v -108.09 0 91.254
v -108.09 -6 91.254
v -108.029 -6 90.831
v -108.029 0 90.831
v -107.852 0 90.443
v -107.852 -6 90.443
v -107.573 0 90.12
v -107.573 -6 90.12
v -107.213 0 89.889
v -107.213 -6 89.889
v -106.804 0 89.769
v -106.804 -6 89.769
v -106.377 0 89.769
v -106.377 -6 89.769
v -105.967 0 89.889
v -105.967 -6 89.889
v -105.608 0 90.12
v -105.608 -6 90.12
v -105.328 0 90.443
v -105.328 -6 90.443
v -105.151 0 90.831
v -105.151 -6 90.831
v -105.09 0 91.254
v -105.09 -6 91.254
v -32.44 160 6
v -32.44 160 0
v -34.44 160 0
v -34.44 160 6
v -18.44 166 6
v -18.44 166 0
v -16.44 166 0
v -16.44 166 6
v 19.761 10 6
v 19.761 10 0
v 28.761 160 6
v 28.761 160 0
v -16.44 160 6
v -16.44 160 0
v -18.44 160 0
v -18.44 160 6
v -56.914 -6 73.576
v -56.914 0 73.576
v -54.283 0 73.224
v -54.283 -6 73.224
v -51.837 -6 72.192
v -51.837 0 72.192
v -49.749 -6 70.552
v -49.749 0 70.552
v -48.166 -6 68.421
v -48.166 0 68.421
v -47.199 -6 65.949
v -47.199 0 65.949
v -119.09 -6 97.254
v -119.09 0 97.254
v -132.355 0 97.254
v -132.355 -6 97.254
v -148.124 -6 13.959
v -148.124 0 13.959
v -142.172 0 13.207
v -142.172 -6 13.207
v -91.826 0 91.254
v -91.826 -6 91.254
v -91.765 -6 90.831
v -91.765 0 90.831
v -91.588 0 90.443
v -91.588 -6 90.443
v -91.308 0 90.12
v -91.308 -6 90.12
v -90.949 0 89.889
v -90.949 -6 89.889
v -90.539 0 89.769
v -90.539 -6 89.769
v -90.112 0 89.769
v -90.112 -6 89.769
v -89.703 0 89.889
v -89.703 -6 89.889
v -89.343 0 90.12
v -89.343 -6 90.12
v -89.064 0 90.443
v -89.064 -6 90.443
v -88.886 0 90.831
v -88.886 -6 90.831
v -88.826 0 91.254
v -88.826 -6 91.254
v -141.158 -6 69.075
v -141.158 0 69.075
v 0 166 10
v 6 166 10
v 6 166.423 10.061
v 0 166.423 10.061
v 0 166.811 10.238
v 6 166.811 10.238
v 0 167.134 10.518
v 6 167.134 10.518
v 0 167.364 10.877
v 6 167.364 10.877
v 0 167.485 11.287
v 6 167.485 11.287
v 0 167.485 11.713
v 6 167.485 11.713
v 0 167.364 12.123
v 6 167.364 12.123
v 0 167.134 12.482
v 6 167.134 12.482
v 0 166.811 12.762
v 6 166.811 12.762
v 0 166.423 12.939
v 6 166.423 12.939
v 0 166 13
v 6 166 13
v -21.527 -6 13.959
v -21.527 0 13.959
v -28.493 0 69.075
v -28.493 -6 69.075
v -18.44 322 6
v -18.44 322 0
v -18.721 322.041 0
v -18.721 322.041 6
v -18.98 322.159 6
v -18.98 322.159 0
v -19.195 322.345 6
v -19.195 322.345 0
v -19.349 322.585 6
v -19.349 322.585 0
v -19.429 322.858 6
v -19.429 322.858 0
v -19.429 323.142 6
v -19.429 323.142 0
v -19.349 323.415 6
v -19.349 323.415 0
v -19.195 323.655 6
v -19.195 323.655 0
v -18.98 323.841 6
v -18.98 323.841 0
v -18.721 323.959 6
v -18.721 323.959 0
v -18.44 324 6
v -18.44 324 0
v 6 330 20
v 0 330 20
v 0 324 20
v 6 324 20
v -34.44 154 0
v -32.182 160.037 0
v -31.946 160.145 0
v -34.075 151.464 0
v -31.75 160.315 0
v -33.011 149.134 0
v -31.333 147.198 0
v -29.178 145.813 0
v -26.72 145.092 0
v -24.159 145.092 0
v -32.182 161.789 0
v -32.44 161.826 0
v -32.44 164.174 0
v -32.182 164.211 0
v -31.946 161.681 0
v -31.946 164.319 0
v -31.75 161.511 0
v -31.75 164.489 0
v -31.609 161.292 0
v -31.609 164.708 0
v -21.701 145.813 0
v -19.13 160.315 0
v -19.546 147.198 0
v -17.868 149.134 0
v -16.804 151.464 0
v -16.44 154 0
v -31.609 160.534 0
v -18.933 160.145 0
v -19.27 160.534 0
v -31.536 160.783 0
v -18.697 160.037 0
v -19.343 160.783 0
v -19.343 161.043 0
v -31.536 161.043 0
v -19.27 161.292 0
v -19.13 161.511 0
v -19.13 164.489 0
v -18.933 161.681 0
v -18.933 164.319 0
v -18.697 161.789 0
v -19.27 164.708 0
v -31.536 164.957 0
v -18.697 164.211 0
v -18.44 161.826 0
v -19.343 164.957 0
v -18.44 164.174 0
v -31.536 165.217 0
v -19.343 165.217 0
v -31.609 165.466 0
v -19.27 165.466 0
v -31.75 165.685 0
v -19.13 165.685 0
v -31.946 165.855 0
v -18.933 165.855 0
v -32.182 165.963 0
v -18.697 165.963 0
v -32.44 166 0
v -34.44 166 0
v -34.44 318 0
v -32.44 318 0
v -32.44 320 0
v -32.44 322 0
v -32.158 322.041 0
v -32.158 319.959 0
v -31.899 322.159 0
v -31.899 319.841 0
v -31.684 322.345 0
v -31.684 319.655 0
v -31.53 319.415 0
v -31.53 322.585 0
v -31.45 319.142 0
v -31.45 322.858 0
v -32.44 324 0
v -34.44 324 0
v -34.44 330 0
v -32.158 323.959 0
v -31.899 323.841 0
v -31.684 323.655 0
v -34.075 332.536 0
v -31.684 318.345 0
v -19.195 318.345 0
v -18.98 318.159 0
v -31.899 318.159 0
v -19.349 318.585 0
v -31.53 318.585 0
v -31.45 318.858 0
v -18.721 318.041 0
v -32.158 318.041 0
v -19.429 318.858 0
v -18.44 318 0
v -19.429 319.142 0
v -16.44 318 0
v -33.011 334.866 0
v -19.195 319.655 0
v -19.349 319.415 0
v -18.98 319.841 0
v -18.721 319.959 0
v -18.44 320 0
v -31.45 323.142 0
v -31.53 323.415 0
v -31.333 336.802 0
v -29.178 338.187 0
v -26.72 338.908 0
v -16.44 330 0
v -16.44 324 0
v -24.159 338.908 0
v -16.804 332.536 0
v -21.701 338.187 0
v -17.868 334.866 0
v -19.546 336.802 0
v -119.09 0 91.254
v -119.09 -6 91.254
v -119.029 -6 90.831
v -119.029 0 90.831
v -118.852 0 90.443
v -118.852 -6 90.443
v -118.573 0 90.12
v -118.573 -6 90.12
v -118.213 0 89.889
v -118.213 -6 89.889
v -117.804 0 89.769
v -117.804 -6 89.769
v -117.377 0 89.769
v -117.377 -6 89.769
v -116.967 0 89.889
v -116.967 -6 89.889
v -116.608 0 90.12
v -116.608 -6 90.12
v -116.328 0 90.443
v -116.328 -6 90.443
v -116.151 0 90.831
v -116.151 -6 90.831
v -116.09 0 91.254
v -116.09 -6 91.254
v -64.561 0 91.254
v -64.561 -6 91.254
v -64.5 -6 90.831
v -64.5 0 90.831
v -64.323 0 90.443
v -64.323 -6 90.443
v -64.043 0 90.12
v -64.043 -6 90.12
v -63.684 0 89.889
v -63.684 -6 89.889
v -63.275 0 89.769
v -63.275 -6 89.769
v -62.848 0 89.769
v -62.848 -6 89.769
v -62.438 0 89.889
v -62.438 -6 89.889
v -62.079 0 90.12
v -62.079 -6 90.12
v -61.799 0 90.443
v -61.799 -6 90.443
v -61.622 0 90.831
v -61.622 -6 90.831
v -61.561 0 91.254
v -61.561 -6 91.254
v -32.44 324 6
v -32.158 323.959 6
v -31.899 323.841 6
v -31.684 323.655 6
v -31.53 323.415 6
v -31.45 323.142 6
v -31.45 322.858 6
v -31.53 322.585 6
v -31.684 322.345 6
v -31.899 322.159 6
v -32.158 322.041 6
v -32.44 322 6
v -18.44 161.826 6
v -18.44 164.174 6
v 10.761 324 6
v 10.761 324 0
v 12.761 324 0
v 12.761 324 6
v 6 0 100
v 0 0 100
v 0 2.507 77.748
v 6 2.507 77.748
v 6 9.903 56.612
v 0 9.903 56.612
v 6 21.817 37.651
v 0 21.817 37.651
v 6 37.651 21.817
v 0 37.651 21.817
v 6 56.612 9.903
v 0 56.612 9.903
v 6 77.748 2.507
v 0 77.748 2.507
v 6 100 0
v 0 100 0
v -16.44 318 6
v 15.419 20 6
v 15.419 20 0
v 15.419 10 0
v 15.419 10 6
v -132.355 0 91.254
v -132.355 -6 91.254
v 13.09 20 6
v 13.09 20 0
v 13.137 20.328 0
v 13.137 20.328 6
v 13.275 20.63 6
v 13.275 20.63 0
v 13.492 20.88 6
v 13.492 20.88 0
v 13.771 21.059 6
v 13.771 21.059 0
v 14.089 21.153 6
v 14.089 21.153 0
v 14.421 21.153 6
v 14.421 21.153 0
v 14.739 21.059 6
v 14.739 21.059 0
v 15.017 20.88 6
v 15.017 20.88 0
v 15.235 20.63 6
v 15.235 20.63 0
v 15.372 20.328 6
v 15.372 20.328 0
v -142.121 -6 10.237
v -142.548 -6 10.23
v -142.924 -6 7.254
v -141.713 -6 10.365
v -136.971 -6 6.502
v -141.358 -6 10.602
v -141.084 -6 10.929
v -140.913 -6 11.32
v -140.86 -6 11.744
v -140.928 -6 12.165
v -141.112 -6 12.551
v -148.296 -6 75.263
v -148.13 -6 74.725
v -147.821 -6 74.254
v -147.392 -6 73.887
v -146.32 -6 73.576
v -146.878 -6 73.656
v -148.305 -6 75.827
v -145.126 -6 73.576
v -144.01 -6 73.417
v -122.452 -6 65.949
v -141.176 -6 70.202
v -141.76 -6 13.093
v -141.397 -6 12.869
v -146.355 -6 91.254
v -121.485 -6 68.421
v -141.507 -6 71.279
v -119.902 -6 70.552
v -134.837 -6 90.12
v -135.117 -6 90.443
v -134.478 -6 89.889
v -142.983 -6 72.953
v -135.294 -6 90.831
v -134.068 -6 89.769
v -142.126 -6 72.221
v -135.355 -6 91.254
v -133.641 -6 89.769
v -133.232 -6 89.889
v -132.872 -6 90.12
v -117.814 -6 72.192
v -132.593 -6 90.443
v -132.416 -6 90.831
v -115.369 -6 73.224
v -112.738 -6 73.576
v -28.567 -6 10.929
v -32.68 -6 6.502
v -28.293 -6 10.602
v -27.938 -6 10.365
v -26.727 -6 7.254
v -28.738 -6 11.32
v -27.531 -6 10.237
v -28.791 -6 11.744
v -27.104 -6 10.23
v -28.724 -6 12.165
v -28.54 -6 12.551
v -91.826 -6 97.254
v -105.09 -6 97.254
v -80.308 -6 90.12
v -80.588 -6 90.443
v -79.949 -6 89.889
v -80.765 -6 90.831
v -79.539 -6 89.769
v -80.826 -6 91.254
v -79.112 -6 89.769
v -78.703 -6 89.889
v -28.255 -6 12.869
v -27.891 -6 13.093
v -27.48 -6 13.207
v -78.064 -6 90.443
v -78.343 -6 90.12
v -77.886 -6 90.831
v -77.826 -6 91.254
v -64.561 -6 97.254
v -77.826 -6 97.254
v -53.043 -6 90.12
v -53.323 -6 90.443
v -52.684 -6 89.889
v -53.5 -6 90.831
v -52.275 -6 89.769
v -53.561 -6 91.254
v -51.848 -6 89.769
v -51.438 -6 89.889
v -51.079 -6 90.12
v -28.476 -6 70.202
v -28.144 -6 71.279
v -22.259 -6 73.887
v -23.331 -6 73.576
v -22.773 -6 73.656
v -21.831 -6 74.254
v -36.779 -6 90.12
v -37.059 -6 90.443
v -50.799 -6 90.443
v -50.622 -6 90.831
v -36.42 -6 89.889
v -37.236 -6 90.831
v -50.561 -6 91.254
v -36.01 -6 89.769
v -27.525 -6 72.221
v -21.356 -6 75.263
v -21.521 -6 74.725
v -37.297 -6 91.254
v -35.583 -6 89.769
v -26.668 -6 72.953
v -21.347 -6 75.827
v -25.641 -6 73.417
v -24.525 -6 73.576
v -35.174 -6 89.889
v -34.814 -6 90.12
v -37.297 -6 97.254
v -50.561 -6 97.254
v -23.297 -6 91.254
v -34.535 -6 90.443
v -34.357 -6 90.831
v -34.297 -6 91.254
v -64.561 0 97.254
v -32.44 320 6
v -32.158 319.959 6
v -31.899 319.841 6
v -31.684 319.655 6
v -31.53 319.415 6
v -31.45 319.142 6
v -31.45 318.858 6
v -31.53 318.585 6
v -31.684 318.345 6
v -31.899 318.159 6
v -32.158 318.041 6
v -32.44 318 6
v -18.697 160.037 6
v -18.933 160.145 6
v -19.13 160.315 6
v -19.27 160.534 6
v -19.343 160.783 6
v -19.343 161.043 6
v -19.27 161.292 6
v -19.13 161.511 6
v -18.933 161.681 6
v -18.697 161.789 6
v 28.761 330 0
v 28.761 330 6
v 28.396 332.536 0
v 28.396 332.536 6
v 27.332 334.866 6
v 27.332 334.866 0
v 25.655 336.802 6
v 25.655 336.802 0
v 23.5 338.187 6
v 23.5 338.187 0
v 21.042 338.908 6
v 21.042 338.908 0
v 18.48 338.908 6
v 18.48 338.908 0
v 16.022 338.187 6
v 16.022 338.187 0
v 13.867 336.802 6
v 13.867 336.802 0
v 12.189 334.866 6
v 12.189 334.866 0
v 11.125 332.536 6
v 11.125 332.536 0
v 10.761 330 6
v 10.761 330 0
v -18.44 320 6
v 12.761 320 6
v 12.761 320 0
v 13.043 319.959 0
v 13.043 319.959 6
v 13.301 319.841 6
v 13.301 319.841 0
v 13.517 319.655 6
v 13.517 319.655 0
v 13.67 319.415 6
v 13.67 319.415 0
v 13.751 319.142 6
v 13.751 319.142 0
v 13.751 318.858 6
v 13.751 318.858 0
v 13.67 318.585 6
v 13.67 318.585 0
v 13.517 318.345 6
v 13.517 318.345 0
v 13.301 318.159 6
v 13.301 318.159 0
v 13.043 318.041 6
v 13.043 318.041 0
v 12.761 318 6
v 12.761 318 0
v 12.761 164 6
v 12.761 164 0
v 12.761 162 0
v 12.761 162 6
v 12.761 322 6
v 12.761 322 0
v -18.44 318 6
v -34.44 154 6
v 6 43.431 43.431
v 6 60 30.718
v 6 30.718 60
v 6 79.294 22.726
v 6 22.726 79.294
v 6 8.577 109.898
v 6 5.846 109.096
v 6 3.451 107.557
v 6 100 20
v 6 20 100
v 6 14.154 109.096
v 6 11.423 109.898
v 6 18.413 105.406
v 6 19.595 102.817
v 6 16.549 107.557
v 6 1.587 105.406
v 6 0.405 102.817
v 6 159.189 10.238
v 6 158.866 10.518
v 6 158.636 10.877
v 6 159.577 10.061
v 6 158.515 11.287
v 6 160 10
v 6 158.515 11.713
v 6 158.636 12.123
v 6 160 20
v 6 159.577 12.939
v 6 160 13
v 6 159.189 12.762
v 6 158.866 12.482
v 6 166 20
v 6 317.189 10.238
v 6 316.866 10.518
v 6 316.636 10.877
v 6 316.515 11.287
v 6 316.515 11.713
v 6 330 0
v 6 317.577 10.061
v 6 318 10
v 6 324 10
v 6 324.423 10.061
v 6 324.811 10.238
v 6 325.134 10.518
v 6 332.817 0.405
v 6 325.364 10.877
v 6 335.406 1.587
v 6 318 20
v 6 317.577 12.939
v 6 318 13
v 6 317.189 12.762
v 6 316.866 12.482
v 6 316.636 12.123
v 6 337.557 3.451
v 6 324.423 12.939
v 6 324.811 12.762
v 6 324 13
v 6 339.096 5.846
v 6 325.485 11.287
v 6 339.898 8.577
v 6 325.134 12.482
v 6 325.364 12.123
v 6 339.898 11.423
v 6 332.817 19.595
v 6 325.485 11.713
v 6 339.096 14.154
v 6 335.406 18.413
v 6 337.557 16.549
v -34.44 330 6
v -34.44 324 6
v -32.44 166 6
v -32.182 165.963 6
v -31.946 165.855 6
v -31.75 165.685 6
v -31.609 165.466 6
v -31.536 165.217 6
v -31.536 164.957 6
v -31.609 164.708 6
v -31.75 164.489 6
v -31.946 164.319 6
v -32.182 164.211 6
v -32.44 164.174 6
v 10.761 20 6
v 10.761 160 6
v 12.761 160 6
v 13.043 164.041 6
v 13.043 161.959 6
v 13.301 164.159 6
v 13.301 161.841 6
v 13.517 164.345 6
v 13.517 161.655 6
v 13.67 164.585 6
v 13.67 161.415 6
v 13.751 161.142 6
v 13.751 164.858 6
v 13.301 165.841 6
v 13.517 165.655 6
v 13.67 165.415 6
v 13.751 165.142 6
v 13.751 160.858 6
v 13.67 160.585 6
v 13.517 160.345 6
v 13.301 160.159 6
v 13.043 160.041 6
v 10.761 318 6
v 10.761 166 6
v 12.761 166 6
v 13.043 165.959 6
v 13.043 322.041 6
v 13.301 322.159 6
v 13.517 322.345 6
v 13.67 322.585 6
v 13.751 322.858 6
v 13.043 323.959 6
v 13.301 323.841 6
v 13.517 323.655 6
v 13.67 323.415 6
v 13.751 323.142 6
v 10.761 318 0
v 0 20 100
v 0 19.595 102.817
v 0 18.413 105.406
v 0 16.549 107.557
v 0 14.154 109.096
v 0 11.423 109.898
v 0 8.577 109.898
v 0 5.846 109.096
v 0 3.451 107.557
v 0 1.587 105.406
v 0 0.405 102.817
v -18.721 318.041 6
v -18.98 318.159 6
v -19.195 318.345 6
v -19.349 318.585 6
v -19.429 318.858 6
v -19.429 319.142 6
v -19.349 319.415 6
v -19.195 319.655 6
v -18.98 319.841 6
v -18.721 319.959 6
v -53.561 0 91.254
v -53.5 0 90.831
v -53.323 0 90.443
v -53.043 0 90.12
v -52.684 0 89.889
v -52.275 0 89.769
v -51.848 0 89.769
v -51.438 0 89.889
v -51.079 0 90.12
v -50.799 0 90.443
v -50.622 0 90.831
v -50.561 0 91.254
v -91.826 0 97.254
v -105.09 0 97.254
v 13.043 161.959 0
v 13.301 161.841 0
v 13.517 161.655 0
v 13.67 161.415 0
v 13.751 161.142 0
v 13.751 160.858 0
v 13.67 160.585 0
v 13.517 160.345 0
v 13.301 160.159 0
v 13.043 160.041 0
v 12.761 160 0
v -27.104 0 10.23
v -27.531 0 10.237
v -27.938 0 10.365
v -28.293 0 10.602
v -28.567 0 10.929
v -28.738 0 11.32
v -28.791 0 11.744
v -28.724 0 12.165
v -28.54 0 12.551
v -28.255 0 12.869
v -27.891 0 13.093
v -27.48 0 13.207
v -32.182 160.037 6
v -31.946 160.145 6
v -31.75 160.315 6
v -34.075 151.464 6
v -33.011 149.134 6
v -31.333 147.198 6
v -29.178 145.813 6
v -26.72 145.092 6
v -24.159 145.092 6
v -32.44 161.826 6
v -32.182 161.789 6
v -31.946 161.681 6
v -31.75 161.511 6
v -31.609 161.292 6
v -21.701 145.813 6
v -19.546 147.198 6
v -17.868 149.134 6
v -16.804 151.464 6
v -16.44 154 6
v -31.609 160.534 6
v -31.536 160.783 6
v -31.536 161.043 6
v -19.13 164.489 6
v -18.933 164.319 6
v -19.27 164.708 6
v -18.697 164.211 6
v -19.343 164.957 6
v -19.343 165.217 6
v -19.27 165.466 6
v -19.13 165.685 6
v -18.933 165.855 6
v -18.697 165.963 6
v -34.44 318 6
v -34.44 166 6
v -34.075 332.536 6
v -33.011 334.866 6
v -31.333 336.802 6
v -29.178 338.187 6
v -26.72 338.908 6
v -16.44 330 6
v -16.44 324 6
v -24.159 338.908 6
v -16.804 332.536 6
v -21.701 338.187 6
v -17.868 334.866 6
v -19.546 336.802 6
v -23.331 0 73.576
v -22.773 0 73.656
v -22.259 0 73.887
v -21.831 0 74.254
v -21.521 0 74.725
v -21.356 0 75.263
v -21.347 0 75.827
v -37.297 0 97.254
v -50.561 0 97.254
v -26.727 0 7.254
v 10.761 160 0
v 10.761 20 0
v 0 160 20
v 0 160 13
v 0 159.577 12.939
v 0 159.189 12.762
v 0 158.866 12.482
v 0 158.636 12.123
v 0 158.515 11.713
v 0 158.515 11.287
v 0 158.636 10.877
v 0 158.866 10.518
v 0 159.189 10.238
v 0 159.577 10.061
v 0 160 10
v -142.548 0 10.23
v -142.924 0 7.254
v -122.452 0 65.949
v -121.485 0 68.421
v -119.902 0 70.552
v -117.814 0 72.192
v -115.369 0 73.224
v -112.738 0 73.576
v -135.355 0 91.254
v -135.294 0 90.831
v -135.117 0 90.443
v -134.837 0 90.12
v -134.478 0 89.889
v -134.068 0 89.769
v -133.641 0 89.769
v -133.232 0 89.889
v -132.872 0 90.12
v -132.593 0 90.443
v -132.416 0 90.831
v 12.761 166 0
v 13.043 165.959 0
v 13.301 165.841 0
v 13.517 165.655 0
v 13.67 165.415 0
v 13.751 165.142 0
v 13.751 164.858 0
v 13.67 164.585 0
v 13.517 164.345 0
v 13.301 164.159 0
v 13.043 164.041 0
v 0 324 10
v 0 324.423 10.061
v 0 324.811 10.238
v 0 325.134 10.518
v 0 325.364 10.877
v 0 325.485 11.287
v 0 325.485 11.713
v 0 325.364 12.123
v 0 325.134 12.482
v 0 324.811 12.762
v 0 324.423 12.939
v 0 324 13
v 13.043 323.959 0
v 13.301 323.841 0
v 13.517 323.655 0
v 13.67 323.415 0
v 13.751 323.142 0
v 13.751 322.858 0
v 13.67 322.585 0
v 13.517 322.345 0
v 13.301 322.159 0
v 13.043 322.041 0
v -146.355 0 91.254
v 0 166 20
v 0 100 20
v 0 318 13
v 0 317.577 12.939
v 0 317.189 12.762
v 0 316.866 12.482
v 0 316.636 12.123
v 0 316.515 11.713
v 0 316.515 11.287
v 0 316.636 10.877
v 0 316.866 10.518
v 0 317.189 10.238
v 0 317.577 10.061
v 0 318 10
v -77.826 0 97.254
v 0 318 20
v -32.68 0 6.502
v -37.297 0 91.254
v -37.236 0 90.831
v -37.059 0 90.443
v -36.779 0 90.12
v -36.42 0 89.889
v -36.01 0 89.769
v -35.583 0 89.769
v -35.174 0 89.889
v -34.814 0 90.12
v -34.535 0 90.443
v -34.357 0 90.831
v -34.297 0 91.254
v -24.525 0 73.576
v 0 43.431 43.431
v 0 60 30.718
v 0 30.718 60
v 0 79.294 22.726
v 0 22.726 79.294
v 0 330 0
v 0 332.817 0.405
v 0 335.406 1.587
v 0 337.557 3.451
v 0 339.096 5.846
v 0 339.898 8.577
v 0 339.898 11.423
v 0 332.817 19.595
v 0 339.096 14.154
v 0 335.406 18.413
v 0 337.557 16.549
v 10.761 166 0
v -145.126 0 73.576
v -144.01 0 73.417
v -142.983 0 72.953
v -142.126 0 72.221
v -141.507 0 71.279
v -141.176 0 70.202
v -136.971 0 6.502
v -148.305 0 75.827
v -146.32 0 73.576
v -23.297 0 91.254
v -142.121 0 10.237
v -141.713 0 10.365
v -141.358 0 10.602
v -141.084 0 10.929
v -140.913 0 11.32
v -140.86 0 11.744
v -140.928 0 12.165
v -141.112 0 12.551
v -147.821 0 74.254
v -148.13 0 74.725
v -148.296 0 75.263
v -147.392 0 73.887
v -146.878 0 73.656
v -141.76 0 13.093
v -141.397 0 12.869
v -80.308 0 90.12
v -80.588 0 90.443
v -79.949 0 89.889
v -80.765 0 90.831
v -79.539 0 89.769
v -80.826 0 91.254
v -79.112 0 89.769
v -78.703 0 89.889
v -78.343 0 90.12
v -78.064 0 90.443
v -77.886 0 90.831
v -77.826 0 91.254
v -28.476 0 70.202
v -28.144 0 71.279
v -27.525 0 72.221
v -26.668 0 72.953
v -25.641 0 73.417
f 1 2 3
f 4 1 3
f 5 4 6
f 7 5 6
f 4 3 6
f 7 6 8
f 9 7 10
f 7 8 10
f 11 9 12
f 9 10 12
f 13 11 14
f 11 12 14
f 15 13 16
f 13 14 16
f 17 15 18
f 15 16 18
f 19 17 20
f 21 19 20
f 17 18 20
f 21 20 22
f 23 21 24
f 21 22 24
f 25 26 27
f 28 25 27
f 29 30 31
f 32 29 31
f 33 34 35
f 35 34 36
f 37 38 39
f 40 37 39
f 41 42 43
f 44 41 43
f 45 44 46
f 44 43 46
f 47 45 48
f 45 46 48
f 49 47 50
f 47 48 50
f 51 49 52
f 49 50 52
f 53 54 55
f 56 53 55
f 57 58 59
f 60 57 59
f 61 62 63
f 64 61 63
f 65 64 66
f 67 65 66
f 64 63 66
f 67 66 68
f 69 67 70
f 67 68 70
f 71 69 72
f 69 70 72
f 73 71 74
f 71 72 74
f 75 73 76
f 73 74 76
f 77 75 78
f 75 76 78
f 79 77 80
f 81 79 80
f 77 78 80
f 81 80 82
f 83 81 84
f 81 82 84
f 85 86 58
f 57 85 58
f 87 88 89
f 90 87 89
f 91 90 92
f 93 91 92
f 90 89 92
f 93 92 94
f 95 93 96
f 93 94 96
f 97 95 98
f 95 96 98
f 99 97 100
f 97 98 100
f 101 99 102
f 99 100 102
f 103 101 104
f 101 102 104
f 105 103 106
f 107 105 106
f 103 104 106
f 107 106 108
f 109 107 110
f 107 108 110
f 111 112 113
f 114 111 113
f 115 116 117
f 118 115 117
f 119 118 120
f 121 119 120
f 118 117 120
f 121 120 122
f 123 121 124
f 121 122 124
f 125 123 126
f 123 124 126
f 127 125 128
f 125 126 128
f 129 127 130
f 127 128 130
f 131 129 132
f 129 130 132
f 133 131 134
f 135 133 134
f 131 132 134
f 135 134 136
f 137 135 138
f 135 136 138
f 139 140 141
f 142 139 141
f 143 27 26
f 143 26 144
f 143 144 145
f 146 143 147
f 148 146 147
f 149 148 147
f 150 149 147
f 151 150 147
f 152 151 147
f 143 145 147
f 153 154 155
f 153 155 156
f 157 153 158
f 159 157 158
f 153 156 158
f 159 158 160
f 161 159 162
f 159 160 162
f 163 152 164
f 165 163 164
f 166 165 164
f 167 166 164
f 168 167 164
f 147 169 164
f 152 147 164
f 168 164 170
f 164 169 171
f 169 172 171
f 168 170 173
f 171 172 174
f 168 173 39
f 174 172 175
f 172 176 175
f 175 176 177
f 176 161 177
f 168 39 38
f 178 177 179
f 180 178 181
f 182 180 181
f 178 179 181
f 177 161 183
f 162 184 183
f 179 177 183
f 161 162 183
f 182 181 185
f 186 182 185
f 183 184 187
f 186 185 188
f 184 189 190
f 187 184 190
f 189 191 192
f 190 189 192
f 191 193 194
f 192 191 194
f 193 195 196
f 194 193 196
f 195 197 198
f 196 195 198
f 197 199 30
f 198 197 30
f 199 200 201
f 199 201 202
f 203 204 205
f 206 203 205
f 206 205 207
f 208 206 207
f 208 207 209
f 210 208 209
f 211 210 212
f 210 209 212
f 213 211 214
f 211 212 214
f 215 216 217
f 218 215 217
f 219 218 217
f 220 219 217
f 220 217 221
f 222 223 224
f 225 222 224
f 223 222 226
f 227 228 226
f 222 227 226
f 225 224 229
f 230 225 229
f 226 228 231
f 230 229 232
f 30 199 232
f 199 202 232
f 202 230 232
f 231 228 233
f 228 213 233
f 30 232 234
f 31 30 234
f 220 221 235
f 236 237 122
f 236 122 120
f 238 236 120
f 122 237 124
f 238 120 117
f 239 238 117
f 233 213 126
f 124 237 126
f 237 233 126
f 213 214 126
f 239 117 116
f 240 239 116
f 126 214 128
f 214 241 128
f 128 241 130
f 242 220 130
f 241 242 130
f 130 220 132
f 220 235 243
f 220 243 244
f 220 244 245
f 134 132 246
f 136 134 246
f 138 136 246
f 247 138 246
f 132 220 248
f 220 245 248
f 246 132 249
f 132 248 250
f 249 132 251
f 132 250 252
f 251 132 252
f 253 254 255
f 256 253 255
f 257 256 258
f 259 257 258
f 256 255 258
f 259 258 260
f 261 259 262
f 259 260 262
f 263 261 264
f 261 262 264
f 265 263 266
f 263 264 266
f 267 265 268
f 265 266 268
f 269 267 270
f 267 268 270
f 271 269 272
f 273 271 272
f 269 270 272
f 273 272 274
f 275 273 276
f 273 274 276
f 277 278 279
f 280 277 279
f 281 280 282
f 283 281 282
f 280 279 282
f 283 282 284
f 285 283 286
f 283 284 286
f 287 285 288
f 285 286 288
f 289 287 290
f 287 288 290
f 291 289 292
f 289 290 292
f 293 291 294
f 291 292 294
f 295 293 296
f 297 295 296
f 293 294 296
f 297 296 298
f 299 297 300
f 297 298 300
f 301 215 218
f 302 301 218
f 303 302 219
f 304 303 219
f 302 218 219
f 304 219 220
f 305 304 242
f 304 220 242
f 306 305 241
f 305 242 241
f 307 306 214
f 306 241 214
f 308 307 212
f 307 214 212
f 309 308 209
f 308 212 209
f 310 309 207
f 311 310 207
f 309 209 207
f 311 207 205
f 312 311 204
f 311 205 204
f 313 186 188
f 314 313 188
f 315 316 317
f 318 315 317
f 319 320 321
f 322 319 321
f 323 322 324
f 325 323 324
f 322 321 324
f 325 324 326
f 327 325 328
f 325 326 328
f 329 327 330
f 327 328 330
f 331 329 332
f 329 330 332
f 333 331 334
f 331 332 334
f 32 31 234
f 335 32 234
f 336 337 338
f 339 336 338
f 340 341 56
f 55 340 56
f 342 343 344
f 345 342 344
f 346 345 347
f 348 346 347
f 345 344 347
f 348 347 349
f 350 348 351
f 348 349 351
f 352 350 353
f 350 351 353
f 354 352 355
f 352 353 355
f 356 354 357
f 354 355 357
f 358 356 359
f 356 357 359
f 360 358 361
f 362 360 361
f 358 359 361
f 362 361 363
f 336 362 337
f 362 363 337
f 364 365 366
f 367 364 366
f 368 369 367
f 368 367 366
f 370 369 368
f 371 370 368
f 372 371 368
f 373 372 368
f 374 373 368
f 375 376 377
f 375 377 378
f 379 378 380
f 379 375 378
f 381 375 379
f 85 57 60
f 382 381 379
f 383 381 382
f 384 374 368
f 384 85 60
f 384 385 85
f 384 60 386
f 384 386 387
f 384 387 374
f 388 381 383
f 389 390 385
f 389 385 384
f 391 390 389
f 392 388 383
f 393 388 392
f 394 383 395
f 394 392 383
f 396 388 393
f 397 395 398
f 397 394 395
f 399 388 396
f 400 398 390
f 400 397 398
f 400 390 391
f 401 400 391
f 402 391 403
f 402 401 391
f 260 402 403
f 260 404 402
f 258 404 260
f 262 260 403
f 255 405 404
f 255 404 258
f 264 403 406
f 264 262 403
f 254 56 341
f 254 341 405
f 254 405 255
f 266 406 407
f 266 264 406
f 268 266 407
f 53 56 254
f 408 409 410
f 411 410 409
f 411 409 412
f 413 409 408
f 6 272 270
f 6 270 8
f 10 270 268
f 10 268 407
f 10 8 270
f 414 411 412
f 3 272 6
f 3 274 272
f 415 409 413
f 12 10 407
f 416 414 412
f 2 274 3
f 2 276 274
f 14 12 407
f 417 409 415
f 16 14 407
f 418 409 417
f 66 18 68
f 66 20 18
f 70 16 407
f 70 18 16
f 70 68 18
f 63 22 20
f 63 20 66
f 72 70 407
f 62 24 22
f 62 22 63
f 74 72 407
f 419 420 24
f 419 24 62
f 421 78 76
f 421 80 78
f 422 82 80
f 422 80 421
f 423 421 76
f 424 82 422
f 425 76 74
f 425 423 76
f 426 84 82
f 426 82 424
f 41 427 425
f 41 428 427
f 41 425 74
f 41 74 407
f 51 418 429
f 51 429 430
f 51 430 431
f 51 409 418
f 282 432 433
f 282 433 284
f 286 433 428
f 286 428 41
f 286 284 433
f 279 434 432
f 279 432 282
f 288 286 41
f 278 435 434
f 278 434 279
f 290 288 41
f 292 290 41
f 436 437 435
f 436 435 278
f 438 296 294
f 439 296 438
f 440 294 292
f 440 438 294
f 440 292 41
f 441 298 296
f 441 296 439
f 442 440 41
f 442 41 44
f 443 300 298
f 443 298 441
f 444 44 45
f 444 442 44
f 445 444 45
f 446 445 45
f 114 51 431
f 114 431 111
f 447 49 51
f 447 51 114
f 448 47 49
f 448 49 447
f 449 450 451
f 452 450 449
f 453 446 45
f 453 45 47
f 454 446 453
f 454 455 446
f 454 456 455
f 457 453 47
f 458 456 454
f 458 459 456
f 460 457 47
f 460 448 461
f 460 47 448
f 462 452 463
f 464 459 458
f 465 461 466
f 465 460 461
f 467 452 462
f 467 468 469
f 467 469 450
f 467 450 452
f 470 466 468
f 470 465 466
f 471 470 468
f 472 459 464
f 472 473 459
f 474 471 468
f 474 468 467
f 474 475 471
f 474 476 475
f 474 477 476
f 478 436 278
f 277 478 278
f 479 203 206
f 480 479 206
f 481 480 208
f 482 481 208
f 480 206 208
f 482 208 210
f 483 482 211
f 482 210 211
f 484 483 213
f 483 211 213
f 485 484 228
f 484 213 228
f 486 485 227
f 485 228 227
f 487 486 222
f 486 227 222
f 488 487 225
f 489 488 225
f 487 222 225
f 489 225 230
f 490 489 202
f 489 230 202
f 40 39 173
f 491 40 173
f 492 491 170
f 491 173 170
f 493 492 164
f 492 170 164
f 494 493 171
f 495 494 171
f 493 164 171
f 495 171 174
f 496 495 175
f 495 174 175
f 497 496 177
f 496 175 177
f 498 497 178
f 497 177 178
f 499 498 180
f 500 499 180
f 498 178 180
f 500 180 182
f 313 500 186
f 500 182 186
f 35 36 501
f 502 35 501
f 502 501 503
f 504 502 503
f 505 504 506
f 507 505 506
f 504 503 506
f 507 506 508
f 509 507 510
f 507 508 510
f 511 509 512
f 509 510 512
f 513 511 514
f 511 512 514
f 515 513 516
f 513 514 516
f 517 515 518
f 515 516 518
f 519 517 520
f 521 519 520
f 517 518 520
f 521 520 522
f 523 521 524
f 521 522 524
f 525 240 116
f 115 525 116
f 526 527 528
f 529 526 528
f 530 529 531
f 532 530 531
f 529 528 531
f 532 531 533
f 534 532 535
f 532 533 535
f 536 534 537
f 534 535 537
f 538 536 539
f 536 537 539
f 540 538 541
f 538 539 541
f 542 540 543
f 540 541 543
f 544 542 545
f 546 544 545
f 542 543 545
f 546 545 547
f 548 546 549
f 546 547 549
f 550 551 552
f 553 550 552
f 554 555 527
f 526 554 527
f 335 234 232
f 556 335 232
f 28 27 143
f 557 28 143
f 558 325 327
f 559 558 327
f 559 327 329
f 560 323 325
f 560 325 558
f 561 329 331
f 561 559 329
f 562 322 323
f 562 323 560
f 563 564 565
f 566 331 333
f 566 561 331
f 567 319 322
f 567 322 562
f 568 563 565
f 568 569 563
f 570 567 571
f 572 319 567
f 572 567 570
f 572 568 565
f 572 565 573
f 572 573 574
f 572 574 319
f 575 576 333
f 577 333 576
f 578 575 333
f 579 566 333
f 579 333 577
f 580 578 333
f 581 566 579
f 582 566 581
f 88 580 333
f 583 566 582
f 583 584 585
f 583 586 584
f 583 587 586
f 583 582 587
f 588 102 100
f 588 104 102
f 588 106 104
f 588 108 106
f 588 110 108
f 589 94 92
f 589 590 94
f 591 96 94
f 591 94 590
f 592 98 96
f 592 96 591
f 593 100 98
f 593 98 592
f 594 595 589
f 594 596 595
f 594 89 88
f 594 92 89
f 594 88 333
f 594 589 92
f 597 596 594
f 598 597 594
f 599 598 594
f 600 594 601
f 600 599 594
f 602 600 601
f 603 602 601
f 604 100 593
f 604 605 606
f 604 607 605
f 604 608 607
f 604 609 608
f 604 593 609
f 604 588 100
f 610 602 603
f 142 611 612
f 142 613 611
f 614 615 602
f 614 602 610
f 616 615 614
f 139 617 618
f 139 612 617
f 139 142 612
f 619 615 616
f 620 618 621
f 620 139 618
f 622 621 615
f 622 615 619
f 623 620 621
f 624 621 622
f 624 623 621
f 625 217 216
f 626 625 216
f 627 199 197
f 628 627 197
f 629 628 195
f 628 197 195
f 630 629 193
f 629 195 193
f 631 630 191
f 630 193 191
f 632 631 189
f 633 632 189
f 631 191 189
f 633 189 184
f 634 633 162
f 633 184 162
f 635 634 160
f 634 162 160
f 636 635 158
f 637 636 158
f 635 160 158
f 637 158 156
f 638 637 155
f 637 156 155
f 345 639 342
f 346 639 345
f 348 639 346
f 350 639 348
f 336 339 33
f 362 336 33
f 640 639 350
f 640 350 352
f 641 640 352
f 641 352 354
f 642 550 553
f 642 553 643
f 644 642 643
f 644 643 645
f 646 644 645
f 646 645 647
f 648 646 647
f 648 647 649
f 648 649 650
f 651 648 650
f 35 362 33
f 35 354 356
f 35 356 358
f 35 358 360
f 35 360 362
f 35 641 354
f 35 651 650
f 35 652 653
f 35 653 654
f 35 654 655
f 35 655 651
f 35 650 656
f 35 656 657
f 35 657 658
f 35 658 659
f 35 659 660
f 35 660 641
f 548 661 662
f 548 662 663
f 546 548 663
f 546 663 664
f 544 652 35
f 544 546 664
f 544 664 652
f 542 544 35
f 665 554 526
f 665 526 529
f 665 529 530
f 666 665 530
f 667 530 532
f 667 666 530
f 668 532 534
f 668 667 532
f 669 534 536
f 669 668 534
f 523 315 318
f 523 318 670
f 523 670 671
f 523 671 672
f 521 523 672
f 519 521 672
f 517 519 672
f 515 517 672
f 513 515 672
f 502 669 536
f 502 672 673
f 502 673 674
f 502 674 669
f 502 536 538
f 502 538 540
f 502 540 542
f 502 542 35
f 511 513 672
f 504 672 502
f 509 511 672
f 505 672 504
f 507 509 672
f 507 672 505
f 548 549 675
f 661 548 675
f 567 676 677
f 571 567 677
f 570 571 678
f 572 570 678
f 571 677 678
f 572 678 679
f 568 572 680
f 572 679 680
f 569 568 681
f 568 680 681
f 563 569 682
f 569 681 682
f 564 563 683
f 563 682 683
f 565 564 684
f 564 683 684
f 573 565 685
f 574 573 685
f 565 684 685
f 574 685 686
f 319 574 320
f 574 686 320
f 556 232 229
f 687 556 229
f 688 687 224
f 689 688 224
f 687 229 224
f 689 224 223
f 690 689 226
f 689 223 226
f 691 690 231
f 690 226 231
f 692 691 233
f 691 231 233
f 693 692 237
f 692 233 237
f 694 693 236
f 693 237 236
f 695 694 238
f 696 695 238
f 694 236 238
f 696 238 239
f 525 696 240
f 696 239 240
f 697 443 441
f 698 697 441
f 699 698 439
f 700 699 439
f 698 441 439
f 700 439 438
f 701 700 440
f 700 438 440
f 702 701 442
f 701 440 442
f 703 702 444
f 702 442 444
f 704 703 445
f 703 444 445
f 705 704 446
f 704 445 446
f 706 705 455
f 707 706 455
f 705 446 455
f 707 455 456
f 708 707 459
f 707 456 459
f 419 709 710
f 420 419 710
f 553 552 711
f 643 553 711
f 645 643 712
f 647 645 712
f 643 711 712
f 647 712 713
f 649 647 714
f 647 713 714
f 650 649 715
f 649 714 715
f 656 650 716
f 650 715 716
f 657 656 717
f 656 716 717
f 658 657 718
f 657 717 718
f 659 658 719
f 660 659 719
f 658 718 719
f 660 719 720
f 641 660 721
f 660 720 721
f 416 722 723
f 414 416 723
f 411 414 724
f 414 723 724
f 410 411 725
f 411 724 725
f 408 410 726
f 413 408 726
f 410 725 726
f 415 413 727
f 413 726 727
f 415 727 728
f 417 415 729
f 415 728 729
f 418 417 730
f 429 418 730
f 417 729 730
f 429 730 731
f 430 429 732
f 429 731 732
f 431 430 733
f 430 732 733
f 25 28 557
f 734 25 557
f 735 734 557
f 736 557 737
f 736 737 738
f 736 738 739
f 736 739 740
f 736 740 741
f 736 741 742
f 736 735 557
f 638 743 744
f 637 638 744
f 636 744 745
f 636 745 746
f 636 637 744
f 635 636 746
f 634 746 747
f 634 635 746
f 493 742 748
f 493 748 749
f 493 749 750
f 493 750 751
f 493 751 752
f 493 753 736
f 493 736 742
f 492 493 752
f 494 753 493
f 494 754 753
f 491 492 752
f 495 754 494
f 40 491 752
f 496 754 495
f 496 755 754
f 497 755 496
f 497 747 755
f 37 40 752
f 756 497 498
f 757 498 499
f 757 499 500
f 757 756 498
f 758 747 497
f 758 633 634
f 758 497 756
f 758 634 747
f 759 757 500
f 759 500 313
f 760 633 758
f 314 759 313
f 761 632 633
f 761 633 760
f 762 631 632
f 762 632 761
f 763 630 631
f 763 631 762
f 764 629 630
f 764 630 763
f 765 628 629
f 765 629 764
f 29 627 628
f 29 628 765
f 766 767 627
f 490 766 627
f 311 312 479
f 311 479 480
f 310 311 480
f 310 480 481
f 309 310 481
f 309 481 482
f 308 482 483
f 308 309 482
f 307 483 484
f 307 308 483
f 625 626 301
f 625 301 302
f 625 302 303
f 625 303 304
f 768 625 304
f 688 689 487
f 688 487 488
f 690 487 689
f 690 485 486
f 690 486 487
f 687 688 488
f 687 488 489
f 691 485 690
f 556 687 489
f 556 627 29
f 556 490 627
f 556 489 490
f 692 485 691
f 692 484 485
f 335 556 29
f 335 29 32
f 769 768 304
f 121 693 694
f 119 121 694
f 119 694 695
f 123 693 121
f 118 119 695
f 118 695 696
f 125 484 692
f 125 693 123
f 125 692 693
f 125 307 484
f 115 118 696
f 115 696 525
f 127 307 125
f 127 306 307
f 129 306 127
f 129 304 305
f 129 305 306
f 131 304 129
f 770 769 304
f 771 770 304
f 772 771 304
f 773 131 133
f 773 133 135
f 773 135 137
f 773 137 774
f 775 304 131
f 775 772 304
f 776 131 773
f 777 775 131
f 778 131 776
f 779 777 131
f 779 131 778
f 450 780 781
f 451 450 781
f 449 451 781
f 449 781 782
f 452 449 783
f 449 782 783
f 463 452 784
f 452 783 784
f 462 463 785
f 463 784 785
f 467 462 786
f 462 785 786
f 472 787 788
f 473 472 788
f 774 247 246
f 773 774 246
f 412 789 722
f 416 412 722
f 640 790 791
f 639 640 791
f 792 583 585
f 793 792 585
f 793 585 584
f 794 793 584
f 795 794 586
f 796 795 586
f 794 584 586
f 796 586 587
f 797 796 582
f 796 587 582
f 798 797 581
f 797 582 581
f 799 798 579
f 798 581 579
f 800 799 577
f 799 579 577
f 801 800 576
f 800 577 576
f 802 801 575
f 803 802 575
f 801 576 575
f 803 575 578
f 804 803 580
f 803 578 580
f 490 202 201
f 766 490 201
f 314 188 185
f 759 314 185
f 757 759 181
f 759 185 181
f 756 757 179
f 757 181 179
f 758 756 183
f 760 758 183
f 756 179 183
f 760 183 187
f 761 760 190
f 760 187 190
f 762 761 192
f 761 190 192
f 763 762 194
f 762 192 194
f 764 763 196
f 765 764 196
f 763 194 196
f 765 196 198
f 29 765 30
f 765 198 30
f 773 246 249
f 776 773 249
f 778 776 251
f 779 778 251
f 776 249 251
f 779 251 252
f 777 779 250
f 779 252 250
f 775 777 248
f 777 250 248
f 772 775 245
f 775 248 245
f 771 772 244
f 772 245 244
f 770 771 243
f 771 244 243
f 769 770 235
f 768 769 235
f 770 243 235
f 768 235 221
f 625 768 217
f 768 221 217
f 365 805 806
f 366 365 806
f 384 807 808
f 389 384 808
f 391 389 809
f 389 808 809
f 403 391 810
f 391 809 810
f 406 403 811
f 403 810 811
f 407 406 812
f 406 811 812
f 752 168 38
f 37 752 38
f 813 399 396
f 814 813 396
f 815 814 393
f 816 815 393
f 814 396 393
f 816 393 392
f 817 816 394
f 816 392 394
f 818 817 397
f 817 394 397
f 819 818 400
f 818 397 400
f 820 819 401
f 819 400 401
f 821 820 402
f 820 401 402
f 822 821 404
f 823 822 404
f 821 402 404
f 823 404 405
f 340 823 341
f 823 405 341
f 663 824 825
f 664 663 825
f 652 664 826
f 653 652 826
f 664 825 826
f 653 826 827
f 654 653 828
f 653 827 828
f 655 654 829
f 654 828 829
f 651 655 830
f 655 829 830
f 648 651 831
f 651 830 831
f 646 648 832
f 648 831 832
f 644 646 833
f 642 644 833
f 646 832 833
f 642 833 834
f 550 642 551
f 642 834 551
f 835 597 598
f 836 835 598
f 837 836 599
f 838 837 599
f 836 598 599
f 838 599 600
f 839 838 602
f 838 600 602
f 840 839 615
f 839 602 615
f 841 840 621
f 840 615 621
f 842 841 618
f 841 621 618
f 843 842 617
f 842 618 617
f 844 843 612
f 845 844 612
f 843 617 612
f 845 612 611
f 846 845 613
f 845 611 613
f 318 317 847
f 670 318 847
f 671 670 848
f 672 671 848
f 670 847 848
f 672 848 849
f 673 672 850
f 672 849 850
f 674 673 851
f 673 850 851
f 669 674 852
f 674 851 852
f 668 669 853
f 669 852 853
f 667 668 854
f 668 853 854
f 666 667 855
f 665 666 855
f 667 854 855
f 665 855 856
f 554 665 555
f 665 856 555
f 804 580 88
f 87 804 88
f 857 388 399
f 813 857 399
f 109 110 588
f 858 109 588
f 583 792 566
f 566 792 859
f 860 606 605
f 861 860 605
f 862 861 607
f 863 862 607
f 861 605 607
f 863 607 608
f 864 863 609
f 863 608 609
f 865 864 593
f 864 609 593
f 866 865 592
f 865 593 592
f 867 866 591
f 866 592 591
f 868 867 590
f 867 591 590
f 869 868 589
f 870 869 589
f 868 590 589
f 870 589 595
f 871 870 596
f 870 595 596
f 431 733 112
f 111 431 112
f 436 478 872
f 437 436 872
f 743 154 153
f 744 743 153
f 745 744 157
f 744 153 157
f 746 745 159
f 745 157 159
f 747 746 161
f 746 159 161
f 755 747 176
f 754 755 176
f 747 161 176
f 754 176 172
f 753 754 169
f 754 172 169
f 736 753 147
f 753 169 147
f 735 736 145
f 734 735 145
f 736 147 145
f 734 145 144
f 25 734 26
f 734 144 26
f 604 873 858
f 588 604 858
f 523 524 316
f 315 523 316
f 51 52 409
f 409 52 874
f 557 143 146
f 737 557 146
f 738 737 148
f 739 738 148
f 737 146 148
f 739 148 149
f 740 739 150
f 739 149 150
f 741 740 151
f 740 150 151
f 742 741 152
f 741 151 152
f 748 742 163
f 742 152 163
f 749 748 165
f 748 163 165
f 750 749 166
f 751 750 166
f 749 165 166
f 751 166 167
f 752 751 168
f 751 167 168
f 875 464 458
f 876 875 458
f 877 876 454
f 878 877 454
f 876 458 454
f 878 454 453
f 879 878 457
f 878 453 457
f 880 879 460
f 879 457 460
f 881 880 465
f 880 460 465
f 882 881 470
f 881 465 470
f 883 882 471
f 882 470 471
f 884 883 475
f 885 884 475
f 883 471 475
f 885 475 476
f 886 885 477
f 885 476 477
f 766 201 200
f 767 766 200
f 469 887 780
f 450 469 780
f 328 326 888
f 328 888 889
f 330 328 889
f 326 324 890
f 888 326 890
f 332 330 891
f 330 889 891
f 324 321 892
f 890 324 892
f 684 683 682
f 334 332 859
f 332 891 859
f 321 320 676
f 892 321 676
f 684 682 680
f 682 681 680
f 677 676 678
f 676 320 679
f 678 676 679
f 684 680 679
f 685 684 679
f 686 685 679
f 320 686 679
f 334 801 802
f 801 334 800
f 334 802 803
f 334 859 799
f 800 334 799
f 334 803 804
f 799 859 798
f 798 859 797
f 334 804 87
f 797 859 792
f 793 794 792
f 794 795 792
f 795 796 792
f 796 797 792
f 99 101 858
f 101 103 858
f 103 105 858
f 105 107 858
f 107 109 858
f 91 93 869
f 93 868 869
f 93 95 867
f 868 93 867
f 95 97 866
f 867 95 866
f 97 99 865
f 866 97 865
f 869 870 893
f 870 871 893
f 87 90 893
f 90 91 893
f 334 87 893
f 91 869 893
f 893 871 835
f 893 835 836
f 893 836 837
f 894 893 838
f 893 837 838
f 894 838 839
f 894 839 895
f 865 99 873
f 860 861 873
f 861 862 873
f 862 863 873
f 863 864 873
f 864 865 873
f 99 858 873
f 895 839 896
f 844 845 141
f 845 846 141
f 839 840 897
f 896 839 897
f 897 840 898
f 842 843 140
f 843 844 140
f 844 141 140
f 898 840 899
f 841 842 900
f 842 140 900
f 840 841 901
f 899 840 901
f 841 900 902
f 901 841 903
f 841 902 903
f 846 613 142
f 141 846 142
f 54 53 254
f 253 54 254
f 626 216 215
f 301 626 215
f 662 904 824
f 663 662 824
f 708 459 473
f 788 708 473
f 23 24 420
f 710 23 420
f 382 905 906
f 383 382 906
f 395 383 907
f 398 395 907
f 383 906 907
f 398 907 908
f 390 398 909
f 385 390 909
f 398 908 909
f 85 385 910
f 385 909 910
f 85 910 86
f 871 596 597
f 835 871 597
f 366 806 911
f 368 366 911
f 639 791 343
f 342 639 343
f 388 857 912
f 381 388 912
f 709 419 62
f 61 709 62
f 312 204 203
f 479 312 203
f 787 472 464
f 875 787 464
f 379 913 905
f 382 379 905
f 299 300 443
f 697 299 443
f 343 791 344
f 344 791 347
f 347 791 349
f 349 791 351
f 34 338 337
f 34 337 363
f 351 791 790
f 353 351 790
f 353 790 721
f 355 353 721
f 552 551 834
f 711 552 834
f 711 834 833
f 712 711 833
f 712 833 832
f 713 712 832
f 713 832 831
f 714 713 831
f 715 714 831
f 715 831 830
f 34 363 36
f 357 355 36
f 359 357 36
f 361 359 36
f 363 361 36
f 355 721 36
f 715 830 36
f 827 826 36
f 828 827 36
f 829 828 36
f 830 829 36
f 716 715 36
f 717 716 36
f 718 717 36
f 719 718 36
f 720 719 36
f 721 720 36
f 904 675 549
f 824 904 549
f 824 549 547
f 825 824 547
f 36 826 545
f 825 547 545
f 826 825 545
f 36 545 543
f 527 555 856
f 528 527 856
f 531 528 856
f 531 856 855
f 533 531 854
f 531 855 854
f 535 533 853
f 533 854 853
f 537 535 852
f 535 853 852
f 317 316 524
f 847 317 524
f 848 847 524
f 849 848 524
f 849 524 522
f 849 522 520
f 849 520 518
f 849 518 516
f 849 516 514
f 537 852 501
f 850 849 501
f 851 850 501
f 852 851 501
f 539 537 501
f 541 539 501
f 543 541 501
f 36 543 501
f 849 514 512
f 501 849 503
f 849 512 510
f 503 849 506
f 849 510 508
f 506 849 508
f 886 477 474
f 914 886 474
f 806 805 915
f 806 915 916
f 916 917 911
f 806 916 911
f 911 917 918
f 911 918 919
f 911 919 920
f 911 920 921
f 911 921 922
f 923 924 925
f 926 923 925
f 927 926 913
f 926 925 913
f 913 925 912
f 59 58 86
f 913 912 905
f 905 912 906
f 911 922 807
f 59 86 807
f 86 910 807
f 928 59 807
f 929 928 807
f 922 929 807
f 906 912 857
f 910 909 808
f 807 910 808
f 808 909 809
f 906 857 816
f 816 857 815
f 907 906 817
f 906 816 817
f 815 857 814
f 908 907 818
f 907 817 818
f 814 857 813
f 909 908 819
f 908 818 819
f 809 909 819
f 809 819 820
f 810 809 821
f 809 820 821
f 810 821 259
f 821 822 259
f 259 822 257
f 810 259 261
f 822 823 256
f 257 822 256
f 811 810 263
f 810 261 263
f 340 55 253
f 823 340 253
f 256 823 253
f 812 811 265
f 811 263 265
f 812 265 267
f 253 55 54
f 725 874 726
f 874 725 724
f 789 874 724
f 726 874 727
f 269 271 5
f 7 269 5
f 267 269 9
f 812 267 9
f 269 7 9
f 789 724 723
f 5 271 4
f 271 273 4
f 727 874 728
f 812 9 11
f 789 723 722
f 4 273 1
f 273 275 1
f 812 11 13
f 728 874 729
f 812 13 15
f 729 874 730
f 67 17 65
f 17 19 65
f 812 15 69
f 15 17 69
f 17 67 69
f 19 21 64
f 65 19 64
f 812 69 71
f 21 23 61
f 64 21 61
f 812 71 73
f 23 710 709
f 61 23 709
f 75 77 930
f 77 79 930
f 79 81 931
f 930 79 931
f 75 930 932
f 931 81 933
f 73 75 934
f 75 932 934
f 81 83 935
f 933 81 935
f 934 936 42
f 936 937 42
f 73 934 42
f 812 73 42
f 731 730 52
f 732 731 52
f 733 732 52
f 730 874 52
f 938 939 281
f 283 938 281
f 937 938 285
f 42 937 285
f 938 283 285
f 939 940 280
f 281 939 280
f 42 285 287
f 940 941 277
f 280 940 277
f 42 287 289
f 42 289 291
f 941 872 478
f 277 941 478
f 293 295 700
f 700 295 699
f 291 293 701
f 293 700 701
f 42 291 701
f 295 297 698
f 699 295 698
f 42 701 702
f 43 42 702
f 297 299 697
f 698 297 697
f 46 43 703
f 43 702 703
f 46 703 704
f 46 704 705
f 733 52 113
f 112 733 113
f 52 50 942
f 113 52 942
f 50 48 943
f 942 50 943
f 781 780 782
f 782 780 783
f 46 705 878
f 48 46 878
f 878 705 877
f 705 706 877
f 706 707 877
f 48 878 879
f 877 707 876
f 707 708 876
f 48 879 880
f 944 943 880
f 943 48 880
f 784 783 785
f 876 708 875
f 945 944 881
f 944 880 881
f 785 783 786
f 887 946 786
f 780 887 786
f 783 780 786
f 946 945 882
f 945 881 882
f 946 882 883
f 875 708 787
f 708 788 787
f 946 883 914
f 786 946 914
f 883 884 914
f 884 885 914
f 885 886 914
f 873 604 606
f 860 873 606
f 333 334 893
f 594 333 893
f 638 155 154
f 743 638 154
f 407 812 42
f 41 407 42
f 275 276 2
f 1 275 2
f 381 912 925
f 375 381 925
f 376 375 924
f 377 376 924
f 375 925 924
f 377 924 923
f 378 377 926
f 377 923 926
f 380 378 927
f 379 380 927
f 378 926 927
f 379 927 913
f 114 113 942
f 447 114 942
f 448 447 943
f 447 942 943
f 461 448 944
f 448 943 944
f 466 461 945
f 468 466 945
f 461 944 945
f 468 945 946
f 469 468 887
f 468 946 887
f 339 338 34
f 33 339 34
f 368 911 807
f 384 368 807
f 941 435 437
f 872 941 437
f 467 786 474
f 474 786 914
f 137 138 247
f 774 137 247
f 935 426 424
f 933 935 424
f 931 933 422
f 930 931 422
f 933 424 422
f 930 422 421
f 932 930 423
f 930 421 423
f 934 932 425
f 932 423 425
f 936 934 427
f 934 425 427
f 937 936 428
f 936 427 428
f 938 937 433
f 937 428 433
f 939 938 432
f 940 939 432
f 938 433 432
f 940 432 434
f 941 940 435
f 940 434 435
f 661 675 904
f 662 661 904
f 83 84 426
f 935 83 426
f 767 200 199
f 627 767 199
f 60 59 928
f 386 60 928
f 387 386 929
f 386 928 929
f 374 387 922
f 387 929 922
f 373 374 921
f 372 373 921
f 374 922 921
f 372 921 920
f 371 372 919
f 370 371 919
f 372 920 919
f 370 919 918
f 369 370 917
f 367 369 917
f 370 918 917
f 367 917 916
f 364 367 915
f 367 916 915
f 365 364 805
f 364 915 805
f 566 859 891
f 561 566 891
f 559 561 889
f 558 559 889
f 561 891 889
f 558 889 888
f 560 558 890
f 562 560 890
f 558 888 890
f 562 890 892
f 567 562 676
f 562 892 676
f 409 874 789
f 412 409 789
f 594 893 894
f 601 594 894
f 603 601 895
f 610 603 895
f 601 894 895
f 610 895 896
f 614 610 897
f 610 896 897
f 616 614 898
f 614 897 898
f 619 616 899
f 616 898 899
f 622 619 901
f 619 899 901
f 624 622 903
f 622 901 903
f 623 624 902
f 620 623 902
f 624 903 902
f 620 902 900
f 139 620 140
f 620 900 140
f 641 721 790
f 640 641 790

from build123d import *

# Parameters (mm, degrees)
F1_DEPTH  = 6
F3_DEPTH  = 6
F5_DEPTH  = 25
F7_DEPTH  = 25
F9_DEPTH  = 6
F11_DEPTH = 6


with BuildPart() as f1:
    # F0 (on Right) → F1 (new body)
    with BuildSketch(Plane.YZ):
        with BuildLine():
            Line((100, 0), (330, 0))
            ThreePointArc((330, 0), (340, 10), (330, 20))
            Line((330, 20), (100, 20))
            ThreePointArc((100, 20), (43.431458, 43.431458), (20, 100))
            ThreePointArc((20, 100), (10, 110), (0, 100))
            ThreePointArc((0, 100), (29.289322, 29.289322), (100, 0))
        make_face()
    extrude(amount=F1_DEPTH)

    # F4 (on face) → F5 (cut)
    with BuildSketch(Plane.YZ.offset(6)):
        with BuildLine():
            Line((166, 20), (160, 20))
            Line((160, 20), (160, 13))
            ThreePointArc((160, 13), (158.5, 11.5), (160, 10))
            Line((160, 10), (166, 10))
            ThreePointArc((166, 10), (167.5, 11.5), (166, 13))
            Line((166, 13), (166, 20))
        make_face()
        with BuildLine():
            Line((324, 20), (318, 20))
            Line((318, 20), (318, 13))
            ThreePointArc((318, 13), (316.5, 11.5), (318, 10))
            Line((318, 10), (324, 10))
            ThreePointArc((324, 10), (325.5, 11.5), (324, 13))
            Line((324, 13), (324, 20))
        make_face()
    extrude(amount=-F5_DEPTH, mode=Mode.SUBTRACT)


with BuildPart() as f3:
    # F2 (on Front) → F3 (new body)
    with BuildSketch(Plane.XZ):
        with BuildLine():
            Line((-47.199422, 65.948764), (-32.680076, 6.501512))
            Line((-32.680076, 6.501512), (-26.727435, 7.25388))
            Line((-26.727435, 7.25388), (-27.103619, 10.2302))
            ThreePointArc((-27.103619, 10.2302), (-28.779871, 11.530269), (-27.479803, 13.206521))
            Line((-27.479803, 13.206521), (-21.527161, 13.958889))
            Line((-21.527161, 13.958889), (-28.493355, 69.074536))
            ThreePointArc((-28.493355, 69.074536), (-27.525454, 72.22127), (-24.524927, 73.576115))
            Line((-24.524927, 73.576115), (-23.331016, 73.576115))
            ThreePointArc((-23.331016, 73.576115), (-21.830753, 74.253538), (-21.346803, 75.826904))
            Line((-21.346803, 75.826904), (-24.055007, 97.25388))
            Line((-24.055007, 97.25388), (-84.8257, 97.25388))
            Line((-84.8257, 97.25388), (-145.596393, 97.25388))
            Line((-145.596393, 97.25388), (-148.304598, 75.826904))
            ThreePointArc((-148.304598, 75.826904), (-147.820647, 74.253538), (-146.320384, 73.576115))
            Line((-146.320384, 73.576115), (-145.126473, 73.576115))
            ThreePointArc((-145.126473, 73.576115), (-142.125947, 72.22127), (-141.158045, 69.074536))
            Line((-141.158045, 69.074536), (-148.124239, 13.958889))
            Line((-148.124239, 13.958889), (-142.171598, 13.206521))
            ThreePointArc((-142.171598, 13.206521), (-140.871529, 11.530269), (-142.547782, 10.2302))
            Line((-142.547782, 10.2302), (-142.923966, 7.25388))
            Line((-142.923966, 7.25388), (-136.971324, 6.501512))
            Line((-136.971324, 6.501512), (-122.451978, 65.948764))
            ThreePointArc((-122.451978, 65.948764), (-118.913024, 71.441434), (-112.737528, 73.576115))
            Line((-112.737528, 73.576115), (-84.8257, 73.576115))
            Line((-84.8257, 73.576115), (-56.913872, 73.576115))
            ThreePointArc((-56.913872, 73.576115), (-50.738376, 71.441434), (-47.199422, 65.948764))
        make_face()
    extrude(amount=F3_DEPTH)

    # F6 (on face) → F7 (cut)
    with BuildSketch(Plane.XZ.offset(6)):
        with BuildLine():
            Line((-50.561177, 97.25388), (-64.561177, 97.25388))
            Line((-64.561177, 97.25388), (-64.561177, 91.25388))
            ThreePointArc((-64.561177, 91.25388), (-63.061177, 89.75388), (-61.561177, 91.25388))
            Line((-61.561177, 91.25388), (-53.561177, 91.25388))
            ThreePointArc((-53.561177, 91.25388), (-52.061177, 89.75388), (-50.561177, 91.25388))
            Line((-50.561177, 91.25388), (-50.561177, 97.25388))
        make_face()
        with BuildLine():
            Line((-23.296654, 97.25388), (-37.296654, 97.25388))
            Line((-37.296654, 97.25388), (-37.296654, 91.25388))
            ThreePointArc((-37.296654, 91.25388), (-35.796654, 89.75388), (-34.296654, 91.25388))
            Line((-34.296654, 91.25388), (-23.296654, 91.25388))
            Line((-23.296654, 91.25388), (-23.296654, 97.25388))
        make_face()
        with BuildLine():
            Line((-77.8257, 97.25388), (-91.8257, 97.25388))
            Line((-91.8257, 97.25388), (-91.8257, 91.25388))
            ThreePointArc((-91.8257, 91.25388), (-90.3257, 89.75388), (-88.8257, 91.25388))
            Line((-88.8257, 91.25388), (-80.8257, 91.25388))
            ThreePointArc((-80.8257, 91.25388), (-79.3257, 89.75388), (-77.8257, 91.25388))
            Line((-77.8257, 91.25388), (-77.8257, 97.25388))
        make_face()
        with BuildLine():
            Line((-105.090223, 97.25388), (-119.090223, 97.25388))
            Line((-119.090223, 97.25388), (-119.090223, 91.25388))
            ThreePointArc((-119.090223, 91.25388), (-117.590223, 89.75388), (-116.090223, 91.25388))
            Line((-116.090223, 91.25388), (-108.090223, 91.25388))
            ThreePointArc((-108.090223, 91.25388), (-106.590223, 89.75388), (-105.090223, 91.25388))
            Line((-105.090223, 91.25388), (-105.090223, 97.25388))
        make_face()
        with BuildLine():
            Line((-132.354747, 91.25388), (-132.354747, 97.25388))
            Line((-132.354747, 97.25388), (-146.354747, 97.25388))
            Line((-146.354747, 97.25388), (-146.354747, 91.25388))
            Line((-146.354747, 91.25388), (-135.354747, 91.25388))
            ThreePointArc((-135.354747, 91.25388), (-133.854747, 89.75388), (-132.354747, 91.25388))
        make_face()
    extrude(amount=-F7_DEPTH, mode=Mode.SUBTRACT)


with BuildPart() as f9:
    # F8 (on Top) → F9 (new body)
    with BuildSketch(Plane.XY):
        with BuildLine():
            ThreePointArc((-34.439665, 154), (-25.439665, 145), (-16.439665, 154))
            Line((-16.439665, 154), (-16.439665, 160))
            Line((-16.439665, 160), (-18.439665, 160))
            ThreePointArc((-18.439665, 160), (-19.352493, 160.912828), (-18.439665, 161.825657))
            Line((-18.439665, 161.825657), (-18.439665, 164.174343))
            ThreePointArc((-18.439665, 164.174343), (-19.352493, 165.087172), (-18.439665, 166))
            Line((-18.439665, 166), (-16.439665, 166))
            Line((-16.439665, 166), (-16.439665, 318))
            Line((-16.439665, 318), (-18.439665, 318))
            ThreePointArc((-18.439665, 318), (-19.439665, 319), (-18.439665, 320))
            Line((-18.439665, 320), (-18.439665, 322))
            ThreePointArc((-18.439665, 322), (-19.439665, 323), (-18.439665, 324))
            Line((-18.439665, 324), (-16.439665, 324))
            Line((-16.439665, 324), (-16.439665, 330))
            ThreePointArc((-16.439665, 330), (-25.439665, 339), (-34.439665, 330))
            Line((-34.439665, 330), (-34.439665, 324))
            Line((-34.439665, 324), (-32.439665, 324))
            ThreePointArc((-32.439665, 324), (-31.439665, 323), (-32.439665, 322))
            Line((-32.439665, 322), (-32.439665, 320))
            ThreePointArc((-32.439665, 320), (-31.439665, 319), (-32.439665, 318))
            Line((-32.439665, 318), (-34.439665, 318))
            Line((-34.439665, 318), (-34.439665, 166))
            Line((-34.439665, 166), (-32.439665, 166))
            ThreePointArc((-32.439665, 166), (-31.526836, 165.087172), (-32.439665, 164.174343))
            Line((-32.439665, 164.174343), (-32.439665, 161.825657))
            ThreePointArc((-32.439665, 161.825657), (-31.526836, 160.912828), (-32.439665, 160))
            Line((-32.439665, 160), (-34.439665, 160))
            Line((-34.439665, 160), (-34.439665, 154))
        make_face()
    extrude(amount=F9_DEPTH)


with BuildPart() as f11:
    # F10 (on Top) → F11 (new body)
    with BuildSketch(Plane.XY):
        with BuildLine():
            Line((10.760768, 160), (10.760768, 20))
            Line((10.760768, 20), (13.090098, 20))
            ThreePointArc((13.090098, 20), (14.254763, 21.164665), (15.419428, 20))
            Line((15.419428, 20), (15.419428, 10))
            Line((15.419428, 10), (19.760768, 10))
            Line((19.760768, 10), (28.760768, 160))
            Line((28.760768, 160), (28.760768, 330))
            ThreePointArc((28.760768, 330), (19.760768, 339), (10.760768, 330))
            Line((10.760768, 330), (10.760768, 324))
            Line((10.760768, 324), (12.760768, 324))
            ThreePointArc((12.760768, 324), (13.760768, 323), (12.760768, 322))
            Line((12.760768, 322), (12.760768, 320))
            ThreePointArc((12.760768, 320), (13.760768, 319), (12.760768, 318))
            Line((12.760768, 318), (10.760768, 318))
            Line((10.760768, 318), (10.760768, 166))
            Line((10.760768, 166), (12.760768, 166))
            ThreePointArc((12.760768, 166), (13.760768, 165), (12.760768, 164))
            Line((12.760768, 164), (12.760768, 162))
            ThreePointArc((12.760768, 162), (13.760768, 161), (12.760768, 160))
            Line((12.760768, 160), (10.760768, 160))
        make_face()
    extrude(amount=F11_DEPTH)


solid = Compound([f1.part, f3.part, f9.part, f11.part])
